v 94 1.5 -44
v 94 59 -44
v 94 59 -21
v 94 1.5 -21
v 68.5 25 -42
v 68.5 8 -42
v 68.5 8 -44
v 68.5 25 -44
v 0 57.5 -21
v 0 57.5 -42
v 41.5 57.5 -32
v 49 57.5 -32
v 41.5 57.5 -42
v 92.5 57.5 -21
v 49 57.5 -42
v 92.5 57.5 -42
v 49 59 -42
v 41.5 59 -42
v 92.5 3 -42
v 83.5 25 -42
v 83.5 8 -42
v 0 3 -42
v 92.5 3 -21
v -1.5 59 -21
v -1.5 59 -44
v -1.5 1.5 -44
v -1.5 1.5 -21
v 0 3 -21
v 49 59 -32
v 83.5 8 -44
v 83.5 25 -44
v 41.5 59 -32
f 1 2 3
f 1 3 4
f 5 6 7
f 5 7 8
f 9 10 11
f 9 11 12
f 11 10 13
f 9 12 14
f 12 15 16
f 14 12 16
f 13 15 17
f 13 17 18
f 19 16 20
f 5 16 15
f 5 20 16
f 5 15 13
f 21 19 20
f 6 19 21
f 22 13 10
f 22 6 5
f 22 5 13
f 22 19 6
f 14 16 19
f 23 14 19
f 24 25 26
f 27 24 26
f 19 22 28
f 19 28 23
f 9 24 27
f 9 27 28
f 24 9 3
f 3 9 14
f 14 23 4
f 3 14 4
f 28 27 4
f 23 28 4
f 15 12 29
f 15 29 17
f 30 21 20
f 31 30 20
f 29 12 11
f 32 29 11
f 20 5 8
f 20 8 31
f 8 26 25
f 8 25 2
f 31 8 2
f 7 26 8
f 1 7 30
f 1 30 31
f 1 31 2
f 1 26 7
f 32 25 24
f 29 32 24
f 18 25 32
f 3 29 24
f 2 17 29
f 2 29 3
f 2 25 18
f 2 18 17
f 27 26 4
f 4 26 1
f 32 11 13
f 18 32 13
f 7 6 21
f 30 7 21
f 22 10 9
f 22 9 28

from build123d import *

# Parameters (mm, degrees)
F0_W     = 95.5
F0_H     = 57.5
F0_W_2   = 92.5
F0_H_2   = 54.5
F0_W_3   = 90.5
F0_H_3   = 52.5
F1_DEPTH = 2
F2_DEPTH = 21
F3_W     = 7.5
F3_H     = 10
F4_DEPTH = 1.5
F5_W     = 15
F5_H     = 17
F6_DEPTH = 2
F7_ANGLE = 180


with BuildPart() as f1:
    # F0 (on Top) → F1 (new body)
    with BuildSketch(Plane.XY):
        with Locations((46.25, -27.25)):
            Rectangle(F0_W, F0_H)
        with Locations((46.25, -27.25)):
            Rectangle(F0_W_2, F0_H_2, mode=Mode.SUBTRACT)
        with Locations((46.25, -27.25)):
            Rectangle(F0_W_2, F0_H_2)
        with Locations((46.25, -27.25)):
            Rectangle(F0_W_3, F0_H_3, mode=Mode.SUBTRACT)
        with Locations((46.25, -27.25)):
            Rectangle(F0_W_3, F0_H_3)
    extrude(amount=F1_DEPTH)

    # F0 (on Top) → F2 (join)
    with BuildSketch(Plane.XY):
        with Locations((46.25, -27.25)):
            Rectangle(F0_W, F0_H)
        with Locations((46.25, -27.25)):
            Rectangle(F0_W_2, F0_H_2, mode=Mode.SUBTRACT)
    extrude(amount=-F2_DEPTH)

    # F3 (on face) → F4 (cut, through all)
    with BuildSketch(Plane(origin=(0, -54.5, 0), x_dir=(-1, 0, 0), z_dir=(0, 1, 0))):
        with Locations((-45.25, -5)):
            Rectangle(F3_W, F3_H)
    extrude(amount=-F4_DEPTH, mode=Mode.SUBTRACT)

    # F5 (on face) → F6 (cut, through all)
    with BuildSketch(Plane(origin=(0, 0, 0), x_dir=(1, 0, 0), z_dir=(0, 0, -1))):
        with Locations((76, 13.5)):
            Rectangle(F5_W, F5_H)
    extrude(amount=-F6_DEPTH, mode=Mode.SUBTRACT)


with BuildPart() as f1_1:
    # F7: moved
    add(f1.part.rotate(Axis((46.25, 1.5, -21), (1, 0, 0)), F7_ANGLE))


solid = f1_1.part
